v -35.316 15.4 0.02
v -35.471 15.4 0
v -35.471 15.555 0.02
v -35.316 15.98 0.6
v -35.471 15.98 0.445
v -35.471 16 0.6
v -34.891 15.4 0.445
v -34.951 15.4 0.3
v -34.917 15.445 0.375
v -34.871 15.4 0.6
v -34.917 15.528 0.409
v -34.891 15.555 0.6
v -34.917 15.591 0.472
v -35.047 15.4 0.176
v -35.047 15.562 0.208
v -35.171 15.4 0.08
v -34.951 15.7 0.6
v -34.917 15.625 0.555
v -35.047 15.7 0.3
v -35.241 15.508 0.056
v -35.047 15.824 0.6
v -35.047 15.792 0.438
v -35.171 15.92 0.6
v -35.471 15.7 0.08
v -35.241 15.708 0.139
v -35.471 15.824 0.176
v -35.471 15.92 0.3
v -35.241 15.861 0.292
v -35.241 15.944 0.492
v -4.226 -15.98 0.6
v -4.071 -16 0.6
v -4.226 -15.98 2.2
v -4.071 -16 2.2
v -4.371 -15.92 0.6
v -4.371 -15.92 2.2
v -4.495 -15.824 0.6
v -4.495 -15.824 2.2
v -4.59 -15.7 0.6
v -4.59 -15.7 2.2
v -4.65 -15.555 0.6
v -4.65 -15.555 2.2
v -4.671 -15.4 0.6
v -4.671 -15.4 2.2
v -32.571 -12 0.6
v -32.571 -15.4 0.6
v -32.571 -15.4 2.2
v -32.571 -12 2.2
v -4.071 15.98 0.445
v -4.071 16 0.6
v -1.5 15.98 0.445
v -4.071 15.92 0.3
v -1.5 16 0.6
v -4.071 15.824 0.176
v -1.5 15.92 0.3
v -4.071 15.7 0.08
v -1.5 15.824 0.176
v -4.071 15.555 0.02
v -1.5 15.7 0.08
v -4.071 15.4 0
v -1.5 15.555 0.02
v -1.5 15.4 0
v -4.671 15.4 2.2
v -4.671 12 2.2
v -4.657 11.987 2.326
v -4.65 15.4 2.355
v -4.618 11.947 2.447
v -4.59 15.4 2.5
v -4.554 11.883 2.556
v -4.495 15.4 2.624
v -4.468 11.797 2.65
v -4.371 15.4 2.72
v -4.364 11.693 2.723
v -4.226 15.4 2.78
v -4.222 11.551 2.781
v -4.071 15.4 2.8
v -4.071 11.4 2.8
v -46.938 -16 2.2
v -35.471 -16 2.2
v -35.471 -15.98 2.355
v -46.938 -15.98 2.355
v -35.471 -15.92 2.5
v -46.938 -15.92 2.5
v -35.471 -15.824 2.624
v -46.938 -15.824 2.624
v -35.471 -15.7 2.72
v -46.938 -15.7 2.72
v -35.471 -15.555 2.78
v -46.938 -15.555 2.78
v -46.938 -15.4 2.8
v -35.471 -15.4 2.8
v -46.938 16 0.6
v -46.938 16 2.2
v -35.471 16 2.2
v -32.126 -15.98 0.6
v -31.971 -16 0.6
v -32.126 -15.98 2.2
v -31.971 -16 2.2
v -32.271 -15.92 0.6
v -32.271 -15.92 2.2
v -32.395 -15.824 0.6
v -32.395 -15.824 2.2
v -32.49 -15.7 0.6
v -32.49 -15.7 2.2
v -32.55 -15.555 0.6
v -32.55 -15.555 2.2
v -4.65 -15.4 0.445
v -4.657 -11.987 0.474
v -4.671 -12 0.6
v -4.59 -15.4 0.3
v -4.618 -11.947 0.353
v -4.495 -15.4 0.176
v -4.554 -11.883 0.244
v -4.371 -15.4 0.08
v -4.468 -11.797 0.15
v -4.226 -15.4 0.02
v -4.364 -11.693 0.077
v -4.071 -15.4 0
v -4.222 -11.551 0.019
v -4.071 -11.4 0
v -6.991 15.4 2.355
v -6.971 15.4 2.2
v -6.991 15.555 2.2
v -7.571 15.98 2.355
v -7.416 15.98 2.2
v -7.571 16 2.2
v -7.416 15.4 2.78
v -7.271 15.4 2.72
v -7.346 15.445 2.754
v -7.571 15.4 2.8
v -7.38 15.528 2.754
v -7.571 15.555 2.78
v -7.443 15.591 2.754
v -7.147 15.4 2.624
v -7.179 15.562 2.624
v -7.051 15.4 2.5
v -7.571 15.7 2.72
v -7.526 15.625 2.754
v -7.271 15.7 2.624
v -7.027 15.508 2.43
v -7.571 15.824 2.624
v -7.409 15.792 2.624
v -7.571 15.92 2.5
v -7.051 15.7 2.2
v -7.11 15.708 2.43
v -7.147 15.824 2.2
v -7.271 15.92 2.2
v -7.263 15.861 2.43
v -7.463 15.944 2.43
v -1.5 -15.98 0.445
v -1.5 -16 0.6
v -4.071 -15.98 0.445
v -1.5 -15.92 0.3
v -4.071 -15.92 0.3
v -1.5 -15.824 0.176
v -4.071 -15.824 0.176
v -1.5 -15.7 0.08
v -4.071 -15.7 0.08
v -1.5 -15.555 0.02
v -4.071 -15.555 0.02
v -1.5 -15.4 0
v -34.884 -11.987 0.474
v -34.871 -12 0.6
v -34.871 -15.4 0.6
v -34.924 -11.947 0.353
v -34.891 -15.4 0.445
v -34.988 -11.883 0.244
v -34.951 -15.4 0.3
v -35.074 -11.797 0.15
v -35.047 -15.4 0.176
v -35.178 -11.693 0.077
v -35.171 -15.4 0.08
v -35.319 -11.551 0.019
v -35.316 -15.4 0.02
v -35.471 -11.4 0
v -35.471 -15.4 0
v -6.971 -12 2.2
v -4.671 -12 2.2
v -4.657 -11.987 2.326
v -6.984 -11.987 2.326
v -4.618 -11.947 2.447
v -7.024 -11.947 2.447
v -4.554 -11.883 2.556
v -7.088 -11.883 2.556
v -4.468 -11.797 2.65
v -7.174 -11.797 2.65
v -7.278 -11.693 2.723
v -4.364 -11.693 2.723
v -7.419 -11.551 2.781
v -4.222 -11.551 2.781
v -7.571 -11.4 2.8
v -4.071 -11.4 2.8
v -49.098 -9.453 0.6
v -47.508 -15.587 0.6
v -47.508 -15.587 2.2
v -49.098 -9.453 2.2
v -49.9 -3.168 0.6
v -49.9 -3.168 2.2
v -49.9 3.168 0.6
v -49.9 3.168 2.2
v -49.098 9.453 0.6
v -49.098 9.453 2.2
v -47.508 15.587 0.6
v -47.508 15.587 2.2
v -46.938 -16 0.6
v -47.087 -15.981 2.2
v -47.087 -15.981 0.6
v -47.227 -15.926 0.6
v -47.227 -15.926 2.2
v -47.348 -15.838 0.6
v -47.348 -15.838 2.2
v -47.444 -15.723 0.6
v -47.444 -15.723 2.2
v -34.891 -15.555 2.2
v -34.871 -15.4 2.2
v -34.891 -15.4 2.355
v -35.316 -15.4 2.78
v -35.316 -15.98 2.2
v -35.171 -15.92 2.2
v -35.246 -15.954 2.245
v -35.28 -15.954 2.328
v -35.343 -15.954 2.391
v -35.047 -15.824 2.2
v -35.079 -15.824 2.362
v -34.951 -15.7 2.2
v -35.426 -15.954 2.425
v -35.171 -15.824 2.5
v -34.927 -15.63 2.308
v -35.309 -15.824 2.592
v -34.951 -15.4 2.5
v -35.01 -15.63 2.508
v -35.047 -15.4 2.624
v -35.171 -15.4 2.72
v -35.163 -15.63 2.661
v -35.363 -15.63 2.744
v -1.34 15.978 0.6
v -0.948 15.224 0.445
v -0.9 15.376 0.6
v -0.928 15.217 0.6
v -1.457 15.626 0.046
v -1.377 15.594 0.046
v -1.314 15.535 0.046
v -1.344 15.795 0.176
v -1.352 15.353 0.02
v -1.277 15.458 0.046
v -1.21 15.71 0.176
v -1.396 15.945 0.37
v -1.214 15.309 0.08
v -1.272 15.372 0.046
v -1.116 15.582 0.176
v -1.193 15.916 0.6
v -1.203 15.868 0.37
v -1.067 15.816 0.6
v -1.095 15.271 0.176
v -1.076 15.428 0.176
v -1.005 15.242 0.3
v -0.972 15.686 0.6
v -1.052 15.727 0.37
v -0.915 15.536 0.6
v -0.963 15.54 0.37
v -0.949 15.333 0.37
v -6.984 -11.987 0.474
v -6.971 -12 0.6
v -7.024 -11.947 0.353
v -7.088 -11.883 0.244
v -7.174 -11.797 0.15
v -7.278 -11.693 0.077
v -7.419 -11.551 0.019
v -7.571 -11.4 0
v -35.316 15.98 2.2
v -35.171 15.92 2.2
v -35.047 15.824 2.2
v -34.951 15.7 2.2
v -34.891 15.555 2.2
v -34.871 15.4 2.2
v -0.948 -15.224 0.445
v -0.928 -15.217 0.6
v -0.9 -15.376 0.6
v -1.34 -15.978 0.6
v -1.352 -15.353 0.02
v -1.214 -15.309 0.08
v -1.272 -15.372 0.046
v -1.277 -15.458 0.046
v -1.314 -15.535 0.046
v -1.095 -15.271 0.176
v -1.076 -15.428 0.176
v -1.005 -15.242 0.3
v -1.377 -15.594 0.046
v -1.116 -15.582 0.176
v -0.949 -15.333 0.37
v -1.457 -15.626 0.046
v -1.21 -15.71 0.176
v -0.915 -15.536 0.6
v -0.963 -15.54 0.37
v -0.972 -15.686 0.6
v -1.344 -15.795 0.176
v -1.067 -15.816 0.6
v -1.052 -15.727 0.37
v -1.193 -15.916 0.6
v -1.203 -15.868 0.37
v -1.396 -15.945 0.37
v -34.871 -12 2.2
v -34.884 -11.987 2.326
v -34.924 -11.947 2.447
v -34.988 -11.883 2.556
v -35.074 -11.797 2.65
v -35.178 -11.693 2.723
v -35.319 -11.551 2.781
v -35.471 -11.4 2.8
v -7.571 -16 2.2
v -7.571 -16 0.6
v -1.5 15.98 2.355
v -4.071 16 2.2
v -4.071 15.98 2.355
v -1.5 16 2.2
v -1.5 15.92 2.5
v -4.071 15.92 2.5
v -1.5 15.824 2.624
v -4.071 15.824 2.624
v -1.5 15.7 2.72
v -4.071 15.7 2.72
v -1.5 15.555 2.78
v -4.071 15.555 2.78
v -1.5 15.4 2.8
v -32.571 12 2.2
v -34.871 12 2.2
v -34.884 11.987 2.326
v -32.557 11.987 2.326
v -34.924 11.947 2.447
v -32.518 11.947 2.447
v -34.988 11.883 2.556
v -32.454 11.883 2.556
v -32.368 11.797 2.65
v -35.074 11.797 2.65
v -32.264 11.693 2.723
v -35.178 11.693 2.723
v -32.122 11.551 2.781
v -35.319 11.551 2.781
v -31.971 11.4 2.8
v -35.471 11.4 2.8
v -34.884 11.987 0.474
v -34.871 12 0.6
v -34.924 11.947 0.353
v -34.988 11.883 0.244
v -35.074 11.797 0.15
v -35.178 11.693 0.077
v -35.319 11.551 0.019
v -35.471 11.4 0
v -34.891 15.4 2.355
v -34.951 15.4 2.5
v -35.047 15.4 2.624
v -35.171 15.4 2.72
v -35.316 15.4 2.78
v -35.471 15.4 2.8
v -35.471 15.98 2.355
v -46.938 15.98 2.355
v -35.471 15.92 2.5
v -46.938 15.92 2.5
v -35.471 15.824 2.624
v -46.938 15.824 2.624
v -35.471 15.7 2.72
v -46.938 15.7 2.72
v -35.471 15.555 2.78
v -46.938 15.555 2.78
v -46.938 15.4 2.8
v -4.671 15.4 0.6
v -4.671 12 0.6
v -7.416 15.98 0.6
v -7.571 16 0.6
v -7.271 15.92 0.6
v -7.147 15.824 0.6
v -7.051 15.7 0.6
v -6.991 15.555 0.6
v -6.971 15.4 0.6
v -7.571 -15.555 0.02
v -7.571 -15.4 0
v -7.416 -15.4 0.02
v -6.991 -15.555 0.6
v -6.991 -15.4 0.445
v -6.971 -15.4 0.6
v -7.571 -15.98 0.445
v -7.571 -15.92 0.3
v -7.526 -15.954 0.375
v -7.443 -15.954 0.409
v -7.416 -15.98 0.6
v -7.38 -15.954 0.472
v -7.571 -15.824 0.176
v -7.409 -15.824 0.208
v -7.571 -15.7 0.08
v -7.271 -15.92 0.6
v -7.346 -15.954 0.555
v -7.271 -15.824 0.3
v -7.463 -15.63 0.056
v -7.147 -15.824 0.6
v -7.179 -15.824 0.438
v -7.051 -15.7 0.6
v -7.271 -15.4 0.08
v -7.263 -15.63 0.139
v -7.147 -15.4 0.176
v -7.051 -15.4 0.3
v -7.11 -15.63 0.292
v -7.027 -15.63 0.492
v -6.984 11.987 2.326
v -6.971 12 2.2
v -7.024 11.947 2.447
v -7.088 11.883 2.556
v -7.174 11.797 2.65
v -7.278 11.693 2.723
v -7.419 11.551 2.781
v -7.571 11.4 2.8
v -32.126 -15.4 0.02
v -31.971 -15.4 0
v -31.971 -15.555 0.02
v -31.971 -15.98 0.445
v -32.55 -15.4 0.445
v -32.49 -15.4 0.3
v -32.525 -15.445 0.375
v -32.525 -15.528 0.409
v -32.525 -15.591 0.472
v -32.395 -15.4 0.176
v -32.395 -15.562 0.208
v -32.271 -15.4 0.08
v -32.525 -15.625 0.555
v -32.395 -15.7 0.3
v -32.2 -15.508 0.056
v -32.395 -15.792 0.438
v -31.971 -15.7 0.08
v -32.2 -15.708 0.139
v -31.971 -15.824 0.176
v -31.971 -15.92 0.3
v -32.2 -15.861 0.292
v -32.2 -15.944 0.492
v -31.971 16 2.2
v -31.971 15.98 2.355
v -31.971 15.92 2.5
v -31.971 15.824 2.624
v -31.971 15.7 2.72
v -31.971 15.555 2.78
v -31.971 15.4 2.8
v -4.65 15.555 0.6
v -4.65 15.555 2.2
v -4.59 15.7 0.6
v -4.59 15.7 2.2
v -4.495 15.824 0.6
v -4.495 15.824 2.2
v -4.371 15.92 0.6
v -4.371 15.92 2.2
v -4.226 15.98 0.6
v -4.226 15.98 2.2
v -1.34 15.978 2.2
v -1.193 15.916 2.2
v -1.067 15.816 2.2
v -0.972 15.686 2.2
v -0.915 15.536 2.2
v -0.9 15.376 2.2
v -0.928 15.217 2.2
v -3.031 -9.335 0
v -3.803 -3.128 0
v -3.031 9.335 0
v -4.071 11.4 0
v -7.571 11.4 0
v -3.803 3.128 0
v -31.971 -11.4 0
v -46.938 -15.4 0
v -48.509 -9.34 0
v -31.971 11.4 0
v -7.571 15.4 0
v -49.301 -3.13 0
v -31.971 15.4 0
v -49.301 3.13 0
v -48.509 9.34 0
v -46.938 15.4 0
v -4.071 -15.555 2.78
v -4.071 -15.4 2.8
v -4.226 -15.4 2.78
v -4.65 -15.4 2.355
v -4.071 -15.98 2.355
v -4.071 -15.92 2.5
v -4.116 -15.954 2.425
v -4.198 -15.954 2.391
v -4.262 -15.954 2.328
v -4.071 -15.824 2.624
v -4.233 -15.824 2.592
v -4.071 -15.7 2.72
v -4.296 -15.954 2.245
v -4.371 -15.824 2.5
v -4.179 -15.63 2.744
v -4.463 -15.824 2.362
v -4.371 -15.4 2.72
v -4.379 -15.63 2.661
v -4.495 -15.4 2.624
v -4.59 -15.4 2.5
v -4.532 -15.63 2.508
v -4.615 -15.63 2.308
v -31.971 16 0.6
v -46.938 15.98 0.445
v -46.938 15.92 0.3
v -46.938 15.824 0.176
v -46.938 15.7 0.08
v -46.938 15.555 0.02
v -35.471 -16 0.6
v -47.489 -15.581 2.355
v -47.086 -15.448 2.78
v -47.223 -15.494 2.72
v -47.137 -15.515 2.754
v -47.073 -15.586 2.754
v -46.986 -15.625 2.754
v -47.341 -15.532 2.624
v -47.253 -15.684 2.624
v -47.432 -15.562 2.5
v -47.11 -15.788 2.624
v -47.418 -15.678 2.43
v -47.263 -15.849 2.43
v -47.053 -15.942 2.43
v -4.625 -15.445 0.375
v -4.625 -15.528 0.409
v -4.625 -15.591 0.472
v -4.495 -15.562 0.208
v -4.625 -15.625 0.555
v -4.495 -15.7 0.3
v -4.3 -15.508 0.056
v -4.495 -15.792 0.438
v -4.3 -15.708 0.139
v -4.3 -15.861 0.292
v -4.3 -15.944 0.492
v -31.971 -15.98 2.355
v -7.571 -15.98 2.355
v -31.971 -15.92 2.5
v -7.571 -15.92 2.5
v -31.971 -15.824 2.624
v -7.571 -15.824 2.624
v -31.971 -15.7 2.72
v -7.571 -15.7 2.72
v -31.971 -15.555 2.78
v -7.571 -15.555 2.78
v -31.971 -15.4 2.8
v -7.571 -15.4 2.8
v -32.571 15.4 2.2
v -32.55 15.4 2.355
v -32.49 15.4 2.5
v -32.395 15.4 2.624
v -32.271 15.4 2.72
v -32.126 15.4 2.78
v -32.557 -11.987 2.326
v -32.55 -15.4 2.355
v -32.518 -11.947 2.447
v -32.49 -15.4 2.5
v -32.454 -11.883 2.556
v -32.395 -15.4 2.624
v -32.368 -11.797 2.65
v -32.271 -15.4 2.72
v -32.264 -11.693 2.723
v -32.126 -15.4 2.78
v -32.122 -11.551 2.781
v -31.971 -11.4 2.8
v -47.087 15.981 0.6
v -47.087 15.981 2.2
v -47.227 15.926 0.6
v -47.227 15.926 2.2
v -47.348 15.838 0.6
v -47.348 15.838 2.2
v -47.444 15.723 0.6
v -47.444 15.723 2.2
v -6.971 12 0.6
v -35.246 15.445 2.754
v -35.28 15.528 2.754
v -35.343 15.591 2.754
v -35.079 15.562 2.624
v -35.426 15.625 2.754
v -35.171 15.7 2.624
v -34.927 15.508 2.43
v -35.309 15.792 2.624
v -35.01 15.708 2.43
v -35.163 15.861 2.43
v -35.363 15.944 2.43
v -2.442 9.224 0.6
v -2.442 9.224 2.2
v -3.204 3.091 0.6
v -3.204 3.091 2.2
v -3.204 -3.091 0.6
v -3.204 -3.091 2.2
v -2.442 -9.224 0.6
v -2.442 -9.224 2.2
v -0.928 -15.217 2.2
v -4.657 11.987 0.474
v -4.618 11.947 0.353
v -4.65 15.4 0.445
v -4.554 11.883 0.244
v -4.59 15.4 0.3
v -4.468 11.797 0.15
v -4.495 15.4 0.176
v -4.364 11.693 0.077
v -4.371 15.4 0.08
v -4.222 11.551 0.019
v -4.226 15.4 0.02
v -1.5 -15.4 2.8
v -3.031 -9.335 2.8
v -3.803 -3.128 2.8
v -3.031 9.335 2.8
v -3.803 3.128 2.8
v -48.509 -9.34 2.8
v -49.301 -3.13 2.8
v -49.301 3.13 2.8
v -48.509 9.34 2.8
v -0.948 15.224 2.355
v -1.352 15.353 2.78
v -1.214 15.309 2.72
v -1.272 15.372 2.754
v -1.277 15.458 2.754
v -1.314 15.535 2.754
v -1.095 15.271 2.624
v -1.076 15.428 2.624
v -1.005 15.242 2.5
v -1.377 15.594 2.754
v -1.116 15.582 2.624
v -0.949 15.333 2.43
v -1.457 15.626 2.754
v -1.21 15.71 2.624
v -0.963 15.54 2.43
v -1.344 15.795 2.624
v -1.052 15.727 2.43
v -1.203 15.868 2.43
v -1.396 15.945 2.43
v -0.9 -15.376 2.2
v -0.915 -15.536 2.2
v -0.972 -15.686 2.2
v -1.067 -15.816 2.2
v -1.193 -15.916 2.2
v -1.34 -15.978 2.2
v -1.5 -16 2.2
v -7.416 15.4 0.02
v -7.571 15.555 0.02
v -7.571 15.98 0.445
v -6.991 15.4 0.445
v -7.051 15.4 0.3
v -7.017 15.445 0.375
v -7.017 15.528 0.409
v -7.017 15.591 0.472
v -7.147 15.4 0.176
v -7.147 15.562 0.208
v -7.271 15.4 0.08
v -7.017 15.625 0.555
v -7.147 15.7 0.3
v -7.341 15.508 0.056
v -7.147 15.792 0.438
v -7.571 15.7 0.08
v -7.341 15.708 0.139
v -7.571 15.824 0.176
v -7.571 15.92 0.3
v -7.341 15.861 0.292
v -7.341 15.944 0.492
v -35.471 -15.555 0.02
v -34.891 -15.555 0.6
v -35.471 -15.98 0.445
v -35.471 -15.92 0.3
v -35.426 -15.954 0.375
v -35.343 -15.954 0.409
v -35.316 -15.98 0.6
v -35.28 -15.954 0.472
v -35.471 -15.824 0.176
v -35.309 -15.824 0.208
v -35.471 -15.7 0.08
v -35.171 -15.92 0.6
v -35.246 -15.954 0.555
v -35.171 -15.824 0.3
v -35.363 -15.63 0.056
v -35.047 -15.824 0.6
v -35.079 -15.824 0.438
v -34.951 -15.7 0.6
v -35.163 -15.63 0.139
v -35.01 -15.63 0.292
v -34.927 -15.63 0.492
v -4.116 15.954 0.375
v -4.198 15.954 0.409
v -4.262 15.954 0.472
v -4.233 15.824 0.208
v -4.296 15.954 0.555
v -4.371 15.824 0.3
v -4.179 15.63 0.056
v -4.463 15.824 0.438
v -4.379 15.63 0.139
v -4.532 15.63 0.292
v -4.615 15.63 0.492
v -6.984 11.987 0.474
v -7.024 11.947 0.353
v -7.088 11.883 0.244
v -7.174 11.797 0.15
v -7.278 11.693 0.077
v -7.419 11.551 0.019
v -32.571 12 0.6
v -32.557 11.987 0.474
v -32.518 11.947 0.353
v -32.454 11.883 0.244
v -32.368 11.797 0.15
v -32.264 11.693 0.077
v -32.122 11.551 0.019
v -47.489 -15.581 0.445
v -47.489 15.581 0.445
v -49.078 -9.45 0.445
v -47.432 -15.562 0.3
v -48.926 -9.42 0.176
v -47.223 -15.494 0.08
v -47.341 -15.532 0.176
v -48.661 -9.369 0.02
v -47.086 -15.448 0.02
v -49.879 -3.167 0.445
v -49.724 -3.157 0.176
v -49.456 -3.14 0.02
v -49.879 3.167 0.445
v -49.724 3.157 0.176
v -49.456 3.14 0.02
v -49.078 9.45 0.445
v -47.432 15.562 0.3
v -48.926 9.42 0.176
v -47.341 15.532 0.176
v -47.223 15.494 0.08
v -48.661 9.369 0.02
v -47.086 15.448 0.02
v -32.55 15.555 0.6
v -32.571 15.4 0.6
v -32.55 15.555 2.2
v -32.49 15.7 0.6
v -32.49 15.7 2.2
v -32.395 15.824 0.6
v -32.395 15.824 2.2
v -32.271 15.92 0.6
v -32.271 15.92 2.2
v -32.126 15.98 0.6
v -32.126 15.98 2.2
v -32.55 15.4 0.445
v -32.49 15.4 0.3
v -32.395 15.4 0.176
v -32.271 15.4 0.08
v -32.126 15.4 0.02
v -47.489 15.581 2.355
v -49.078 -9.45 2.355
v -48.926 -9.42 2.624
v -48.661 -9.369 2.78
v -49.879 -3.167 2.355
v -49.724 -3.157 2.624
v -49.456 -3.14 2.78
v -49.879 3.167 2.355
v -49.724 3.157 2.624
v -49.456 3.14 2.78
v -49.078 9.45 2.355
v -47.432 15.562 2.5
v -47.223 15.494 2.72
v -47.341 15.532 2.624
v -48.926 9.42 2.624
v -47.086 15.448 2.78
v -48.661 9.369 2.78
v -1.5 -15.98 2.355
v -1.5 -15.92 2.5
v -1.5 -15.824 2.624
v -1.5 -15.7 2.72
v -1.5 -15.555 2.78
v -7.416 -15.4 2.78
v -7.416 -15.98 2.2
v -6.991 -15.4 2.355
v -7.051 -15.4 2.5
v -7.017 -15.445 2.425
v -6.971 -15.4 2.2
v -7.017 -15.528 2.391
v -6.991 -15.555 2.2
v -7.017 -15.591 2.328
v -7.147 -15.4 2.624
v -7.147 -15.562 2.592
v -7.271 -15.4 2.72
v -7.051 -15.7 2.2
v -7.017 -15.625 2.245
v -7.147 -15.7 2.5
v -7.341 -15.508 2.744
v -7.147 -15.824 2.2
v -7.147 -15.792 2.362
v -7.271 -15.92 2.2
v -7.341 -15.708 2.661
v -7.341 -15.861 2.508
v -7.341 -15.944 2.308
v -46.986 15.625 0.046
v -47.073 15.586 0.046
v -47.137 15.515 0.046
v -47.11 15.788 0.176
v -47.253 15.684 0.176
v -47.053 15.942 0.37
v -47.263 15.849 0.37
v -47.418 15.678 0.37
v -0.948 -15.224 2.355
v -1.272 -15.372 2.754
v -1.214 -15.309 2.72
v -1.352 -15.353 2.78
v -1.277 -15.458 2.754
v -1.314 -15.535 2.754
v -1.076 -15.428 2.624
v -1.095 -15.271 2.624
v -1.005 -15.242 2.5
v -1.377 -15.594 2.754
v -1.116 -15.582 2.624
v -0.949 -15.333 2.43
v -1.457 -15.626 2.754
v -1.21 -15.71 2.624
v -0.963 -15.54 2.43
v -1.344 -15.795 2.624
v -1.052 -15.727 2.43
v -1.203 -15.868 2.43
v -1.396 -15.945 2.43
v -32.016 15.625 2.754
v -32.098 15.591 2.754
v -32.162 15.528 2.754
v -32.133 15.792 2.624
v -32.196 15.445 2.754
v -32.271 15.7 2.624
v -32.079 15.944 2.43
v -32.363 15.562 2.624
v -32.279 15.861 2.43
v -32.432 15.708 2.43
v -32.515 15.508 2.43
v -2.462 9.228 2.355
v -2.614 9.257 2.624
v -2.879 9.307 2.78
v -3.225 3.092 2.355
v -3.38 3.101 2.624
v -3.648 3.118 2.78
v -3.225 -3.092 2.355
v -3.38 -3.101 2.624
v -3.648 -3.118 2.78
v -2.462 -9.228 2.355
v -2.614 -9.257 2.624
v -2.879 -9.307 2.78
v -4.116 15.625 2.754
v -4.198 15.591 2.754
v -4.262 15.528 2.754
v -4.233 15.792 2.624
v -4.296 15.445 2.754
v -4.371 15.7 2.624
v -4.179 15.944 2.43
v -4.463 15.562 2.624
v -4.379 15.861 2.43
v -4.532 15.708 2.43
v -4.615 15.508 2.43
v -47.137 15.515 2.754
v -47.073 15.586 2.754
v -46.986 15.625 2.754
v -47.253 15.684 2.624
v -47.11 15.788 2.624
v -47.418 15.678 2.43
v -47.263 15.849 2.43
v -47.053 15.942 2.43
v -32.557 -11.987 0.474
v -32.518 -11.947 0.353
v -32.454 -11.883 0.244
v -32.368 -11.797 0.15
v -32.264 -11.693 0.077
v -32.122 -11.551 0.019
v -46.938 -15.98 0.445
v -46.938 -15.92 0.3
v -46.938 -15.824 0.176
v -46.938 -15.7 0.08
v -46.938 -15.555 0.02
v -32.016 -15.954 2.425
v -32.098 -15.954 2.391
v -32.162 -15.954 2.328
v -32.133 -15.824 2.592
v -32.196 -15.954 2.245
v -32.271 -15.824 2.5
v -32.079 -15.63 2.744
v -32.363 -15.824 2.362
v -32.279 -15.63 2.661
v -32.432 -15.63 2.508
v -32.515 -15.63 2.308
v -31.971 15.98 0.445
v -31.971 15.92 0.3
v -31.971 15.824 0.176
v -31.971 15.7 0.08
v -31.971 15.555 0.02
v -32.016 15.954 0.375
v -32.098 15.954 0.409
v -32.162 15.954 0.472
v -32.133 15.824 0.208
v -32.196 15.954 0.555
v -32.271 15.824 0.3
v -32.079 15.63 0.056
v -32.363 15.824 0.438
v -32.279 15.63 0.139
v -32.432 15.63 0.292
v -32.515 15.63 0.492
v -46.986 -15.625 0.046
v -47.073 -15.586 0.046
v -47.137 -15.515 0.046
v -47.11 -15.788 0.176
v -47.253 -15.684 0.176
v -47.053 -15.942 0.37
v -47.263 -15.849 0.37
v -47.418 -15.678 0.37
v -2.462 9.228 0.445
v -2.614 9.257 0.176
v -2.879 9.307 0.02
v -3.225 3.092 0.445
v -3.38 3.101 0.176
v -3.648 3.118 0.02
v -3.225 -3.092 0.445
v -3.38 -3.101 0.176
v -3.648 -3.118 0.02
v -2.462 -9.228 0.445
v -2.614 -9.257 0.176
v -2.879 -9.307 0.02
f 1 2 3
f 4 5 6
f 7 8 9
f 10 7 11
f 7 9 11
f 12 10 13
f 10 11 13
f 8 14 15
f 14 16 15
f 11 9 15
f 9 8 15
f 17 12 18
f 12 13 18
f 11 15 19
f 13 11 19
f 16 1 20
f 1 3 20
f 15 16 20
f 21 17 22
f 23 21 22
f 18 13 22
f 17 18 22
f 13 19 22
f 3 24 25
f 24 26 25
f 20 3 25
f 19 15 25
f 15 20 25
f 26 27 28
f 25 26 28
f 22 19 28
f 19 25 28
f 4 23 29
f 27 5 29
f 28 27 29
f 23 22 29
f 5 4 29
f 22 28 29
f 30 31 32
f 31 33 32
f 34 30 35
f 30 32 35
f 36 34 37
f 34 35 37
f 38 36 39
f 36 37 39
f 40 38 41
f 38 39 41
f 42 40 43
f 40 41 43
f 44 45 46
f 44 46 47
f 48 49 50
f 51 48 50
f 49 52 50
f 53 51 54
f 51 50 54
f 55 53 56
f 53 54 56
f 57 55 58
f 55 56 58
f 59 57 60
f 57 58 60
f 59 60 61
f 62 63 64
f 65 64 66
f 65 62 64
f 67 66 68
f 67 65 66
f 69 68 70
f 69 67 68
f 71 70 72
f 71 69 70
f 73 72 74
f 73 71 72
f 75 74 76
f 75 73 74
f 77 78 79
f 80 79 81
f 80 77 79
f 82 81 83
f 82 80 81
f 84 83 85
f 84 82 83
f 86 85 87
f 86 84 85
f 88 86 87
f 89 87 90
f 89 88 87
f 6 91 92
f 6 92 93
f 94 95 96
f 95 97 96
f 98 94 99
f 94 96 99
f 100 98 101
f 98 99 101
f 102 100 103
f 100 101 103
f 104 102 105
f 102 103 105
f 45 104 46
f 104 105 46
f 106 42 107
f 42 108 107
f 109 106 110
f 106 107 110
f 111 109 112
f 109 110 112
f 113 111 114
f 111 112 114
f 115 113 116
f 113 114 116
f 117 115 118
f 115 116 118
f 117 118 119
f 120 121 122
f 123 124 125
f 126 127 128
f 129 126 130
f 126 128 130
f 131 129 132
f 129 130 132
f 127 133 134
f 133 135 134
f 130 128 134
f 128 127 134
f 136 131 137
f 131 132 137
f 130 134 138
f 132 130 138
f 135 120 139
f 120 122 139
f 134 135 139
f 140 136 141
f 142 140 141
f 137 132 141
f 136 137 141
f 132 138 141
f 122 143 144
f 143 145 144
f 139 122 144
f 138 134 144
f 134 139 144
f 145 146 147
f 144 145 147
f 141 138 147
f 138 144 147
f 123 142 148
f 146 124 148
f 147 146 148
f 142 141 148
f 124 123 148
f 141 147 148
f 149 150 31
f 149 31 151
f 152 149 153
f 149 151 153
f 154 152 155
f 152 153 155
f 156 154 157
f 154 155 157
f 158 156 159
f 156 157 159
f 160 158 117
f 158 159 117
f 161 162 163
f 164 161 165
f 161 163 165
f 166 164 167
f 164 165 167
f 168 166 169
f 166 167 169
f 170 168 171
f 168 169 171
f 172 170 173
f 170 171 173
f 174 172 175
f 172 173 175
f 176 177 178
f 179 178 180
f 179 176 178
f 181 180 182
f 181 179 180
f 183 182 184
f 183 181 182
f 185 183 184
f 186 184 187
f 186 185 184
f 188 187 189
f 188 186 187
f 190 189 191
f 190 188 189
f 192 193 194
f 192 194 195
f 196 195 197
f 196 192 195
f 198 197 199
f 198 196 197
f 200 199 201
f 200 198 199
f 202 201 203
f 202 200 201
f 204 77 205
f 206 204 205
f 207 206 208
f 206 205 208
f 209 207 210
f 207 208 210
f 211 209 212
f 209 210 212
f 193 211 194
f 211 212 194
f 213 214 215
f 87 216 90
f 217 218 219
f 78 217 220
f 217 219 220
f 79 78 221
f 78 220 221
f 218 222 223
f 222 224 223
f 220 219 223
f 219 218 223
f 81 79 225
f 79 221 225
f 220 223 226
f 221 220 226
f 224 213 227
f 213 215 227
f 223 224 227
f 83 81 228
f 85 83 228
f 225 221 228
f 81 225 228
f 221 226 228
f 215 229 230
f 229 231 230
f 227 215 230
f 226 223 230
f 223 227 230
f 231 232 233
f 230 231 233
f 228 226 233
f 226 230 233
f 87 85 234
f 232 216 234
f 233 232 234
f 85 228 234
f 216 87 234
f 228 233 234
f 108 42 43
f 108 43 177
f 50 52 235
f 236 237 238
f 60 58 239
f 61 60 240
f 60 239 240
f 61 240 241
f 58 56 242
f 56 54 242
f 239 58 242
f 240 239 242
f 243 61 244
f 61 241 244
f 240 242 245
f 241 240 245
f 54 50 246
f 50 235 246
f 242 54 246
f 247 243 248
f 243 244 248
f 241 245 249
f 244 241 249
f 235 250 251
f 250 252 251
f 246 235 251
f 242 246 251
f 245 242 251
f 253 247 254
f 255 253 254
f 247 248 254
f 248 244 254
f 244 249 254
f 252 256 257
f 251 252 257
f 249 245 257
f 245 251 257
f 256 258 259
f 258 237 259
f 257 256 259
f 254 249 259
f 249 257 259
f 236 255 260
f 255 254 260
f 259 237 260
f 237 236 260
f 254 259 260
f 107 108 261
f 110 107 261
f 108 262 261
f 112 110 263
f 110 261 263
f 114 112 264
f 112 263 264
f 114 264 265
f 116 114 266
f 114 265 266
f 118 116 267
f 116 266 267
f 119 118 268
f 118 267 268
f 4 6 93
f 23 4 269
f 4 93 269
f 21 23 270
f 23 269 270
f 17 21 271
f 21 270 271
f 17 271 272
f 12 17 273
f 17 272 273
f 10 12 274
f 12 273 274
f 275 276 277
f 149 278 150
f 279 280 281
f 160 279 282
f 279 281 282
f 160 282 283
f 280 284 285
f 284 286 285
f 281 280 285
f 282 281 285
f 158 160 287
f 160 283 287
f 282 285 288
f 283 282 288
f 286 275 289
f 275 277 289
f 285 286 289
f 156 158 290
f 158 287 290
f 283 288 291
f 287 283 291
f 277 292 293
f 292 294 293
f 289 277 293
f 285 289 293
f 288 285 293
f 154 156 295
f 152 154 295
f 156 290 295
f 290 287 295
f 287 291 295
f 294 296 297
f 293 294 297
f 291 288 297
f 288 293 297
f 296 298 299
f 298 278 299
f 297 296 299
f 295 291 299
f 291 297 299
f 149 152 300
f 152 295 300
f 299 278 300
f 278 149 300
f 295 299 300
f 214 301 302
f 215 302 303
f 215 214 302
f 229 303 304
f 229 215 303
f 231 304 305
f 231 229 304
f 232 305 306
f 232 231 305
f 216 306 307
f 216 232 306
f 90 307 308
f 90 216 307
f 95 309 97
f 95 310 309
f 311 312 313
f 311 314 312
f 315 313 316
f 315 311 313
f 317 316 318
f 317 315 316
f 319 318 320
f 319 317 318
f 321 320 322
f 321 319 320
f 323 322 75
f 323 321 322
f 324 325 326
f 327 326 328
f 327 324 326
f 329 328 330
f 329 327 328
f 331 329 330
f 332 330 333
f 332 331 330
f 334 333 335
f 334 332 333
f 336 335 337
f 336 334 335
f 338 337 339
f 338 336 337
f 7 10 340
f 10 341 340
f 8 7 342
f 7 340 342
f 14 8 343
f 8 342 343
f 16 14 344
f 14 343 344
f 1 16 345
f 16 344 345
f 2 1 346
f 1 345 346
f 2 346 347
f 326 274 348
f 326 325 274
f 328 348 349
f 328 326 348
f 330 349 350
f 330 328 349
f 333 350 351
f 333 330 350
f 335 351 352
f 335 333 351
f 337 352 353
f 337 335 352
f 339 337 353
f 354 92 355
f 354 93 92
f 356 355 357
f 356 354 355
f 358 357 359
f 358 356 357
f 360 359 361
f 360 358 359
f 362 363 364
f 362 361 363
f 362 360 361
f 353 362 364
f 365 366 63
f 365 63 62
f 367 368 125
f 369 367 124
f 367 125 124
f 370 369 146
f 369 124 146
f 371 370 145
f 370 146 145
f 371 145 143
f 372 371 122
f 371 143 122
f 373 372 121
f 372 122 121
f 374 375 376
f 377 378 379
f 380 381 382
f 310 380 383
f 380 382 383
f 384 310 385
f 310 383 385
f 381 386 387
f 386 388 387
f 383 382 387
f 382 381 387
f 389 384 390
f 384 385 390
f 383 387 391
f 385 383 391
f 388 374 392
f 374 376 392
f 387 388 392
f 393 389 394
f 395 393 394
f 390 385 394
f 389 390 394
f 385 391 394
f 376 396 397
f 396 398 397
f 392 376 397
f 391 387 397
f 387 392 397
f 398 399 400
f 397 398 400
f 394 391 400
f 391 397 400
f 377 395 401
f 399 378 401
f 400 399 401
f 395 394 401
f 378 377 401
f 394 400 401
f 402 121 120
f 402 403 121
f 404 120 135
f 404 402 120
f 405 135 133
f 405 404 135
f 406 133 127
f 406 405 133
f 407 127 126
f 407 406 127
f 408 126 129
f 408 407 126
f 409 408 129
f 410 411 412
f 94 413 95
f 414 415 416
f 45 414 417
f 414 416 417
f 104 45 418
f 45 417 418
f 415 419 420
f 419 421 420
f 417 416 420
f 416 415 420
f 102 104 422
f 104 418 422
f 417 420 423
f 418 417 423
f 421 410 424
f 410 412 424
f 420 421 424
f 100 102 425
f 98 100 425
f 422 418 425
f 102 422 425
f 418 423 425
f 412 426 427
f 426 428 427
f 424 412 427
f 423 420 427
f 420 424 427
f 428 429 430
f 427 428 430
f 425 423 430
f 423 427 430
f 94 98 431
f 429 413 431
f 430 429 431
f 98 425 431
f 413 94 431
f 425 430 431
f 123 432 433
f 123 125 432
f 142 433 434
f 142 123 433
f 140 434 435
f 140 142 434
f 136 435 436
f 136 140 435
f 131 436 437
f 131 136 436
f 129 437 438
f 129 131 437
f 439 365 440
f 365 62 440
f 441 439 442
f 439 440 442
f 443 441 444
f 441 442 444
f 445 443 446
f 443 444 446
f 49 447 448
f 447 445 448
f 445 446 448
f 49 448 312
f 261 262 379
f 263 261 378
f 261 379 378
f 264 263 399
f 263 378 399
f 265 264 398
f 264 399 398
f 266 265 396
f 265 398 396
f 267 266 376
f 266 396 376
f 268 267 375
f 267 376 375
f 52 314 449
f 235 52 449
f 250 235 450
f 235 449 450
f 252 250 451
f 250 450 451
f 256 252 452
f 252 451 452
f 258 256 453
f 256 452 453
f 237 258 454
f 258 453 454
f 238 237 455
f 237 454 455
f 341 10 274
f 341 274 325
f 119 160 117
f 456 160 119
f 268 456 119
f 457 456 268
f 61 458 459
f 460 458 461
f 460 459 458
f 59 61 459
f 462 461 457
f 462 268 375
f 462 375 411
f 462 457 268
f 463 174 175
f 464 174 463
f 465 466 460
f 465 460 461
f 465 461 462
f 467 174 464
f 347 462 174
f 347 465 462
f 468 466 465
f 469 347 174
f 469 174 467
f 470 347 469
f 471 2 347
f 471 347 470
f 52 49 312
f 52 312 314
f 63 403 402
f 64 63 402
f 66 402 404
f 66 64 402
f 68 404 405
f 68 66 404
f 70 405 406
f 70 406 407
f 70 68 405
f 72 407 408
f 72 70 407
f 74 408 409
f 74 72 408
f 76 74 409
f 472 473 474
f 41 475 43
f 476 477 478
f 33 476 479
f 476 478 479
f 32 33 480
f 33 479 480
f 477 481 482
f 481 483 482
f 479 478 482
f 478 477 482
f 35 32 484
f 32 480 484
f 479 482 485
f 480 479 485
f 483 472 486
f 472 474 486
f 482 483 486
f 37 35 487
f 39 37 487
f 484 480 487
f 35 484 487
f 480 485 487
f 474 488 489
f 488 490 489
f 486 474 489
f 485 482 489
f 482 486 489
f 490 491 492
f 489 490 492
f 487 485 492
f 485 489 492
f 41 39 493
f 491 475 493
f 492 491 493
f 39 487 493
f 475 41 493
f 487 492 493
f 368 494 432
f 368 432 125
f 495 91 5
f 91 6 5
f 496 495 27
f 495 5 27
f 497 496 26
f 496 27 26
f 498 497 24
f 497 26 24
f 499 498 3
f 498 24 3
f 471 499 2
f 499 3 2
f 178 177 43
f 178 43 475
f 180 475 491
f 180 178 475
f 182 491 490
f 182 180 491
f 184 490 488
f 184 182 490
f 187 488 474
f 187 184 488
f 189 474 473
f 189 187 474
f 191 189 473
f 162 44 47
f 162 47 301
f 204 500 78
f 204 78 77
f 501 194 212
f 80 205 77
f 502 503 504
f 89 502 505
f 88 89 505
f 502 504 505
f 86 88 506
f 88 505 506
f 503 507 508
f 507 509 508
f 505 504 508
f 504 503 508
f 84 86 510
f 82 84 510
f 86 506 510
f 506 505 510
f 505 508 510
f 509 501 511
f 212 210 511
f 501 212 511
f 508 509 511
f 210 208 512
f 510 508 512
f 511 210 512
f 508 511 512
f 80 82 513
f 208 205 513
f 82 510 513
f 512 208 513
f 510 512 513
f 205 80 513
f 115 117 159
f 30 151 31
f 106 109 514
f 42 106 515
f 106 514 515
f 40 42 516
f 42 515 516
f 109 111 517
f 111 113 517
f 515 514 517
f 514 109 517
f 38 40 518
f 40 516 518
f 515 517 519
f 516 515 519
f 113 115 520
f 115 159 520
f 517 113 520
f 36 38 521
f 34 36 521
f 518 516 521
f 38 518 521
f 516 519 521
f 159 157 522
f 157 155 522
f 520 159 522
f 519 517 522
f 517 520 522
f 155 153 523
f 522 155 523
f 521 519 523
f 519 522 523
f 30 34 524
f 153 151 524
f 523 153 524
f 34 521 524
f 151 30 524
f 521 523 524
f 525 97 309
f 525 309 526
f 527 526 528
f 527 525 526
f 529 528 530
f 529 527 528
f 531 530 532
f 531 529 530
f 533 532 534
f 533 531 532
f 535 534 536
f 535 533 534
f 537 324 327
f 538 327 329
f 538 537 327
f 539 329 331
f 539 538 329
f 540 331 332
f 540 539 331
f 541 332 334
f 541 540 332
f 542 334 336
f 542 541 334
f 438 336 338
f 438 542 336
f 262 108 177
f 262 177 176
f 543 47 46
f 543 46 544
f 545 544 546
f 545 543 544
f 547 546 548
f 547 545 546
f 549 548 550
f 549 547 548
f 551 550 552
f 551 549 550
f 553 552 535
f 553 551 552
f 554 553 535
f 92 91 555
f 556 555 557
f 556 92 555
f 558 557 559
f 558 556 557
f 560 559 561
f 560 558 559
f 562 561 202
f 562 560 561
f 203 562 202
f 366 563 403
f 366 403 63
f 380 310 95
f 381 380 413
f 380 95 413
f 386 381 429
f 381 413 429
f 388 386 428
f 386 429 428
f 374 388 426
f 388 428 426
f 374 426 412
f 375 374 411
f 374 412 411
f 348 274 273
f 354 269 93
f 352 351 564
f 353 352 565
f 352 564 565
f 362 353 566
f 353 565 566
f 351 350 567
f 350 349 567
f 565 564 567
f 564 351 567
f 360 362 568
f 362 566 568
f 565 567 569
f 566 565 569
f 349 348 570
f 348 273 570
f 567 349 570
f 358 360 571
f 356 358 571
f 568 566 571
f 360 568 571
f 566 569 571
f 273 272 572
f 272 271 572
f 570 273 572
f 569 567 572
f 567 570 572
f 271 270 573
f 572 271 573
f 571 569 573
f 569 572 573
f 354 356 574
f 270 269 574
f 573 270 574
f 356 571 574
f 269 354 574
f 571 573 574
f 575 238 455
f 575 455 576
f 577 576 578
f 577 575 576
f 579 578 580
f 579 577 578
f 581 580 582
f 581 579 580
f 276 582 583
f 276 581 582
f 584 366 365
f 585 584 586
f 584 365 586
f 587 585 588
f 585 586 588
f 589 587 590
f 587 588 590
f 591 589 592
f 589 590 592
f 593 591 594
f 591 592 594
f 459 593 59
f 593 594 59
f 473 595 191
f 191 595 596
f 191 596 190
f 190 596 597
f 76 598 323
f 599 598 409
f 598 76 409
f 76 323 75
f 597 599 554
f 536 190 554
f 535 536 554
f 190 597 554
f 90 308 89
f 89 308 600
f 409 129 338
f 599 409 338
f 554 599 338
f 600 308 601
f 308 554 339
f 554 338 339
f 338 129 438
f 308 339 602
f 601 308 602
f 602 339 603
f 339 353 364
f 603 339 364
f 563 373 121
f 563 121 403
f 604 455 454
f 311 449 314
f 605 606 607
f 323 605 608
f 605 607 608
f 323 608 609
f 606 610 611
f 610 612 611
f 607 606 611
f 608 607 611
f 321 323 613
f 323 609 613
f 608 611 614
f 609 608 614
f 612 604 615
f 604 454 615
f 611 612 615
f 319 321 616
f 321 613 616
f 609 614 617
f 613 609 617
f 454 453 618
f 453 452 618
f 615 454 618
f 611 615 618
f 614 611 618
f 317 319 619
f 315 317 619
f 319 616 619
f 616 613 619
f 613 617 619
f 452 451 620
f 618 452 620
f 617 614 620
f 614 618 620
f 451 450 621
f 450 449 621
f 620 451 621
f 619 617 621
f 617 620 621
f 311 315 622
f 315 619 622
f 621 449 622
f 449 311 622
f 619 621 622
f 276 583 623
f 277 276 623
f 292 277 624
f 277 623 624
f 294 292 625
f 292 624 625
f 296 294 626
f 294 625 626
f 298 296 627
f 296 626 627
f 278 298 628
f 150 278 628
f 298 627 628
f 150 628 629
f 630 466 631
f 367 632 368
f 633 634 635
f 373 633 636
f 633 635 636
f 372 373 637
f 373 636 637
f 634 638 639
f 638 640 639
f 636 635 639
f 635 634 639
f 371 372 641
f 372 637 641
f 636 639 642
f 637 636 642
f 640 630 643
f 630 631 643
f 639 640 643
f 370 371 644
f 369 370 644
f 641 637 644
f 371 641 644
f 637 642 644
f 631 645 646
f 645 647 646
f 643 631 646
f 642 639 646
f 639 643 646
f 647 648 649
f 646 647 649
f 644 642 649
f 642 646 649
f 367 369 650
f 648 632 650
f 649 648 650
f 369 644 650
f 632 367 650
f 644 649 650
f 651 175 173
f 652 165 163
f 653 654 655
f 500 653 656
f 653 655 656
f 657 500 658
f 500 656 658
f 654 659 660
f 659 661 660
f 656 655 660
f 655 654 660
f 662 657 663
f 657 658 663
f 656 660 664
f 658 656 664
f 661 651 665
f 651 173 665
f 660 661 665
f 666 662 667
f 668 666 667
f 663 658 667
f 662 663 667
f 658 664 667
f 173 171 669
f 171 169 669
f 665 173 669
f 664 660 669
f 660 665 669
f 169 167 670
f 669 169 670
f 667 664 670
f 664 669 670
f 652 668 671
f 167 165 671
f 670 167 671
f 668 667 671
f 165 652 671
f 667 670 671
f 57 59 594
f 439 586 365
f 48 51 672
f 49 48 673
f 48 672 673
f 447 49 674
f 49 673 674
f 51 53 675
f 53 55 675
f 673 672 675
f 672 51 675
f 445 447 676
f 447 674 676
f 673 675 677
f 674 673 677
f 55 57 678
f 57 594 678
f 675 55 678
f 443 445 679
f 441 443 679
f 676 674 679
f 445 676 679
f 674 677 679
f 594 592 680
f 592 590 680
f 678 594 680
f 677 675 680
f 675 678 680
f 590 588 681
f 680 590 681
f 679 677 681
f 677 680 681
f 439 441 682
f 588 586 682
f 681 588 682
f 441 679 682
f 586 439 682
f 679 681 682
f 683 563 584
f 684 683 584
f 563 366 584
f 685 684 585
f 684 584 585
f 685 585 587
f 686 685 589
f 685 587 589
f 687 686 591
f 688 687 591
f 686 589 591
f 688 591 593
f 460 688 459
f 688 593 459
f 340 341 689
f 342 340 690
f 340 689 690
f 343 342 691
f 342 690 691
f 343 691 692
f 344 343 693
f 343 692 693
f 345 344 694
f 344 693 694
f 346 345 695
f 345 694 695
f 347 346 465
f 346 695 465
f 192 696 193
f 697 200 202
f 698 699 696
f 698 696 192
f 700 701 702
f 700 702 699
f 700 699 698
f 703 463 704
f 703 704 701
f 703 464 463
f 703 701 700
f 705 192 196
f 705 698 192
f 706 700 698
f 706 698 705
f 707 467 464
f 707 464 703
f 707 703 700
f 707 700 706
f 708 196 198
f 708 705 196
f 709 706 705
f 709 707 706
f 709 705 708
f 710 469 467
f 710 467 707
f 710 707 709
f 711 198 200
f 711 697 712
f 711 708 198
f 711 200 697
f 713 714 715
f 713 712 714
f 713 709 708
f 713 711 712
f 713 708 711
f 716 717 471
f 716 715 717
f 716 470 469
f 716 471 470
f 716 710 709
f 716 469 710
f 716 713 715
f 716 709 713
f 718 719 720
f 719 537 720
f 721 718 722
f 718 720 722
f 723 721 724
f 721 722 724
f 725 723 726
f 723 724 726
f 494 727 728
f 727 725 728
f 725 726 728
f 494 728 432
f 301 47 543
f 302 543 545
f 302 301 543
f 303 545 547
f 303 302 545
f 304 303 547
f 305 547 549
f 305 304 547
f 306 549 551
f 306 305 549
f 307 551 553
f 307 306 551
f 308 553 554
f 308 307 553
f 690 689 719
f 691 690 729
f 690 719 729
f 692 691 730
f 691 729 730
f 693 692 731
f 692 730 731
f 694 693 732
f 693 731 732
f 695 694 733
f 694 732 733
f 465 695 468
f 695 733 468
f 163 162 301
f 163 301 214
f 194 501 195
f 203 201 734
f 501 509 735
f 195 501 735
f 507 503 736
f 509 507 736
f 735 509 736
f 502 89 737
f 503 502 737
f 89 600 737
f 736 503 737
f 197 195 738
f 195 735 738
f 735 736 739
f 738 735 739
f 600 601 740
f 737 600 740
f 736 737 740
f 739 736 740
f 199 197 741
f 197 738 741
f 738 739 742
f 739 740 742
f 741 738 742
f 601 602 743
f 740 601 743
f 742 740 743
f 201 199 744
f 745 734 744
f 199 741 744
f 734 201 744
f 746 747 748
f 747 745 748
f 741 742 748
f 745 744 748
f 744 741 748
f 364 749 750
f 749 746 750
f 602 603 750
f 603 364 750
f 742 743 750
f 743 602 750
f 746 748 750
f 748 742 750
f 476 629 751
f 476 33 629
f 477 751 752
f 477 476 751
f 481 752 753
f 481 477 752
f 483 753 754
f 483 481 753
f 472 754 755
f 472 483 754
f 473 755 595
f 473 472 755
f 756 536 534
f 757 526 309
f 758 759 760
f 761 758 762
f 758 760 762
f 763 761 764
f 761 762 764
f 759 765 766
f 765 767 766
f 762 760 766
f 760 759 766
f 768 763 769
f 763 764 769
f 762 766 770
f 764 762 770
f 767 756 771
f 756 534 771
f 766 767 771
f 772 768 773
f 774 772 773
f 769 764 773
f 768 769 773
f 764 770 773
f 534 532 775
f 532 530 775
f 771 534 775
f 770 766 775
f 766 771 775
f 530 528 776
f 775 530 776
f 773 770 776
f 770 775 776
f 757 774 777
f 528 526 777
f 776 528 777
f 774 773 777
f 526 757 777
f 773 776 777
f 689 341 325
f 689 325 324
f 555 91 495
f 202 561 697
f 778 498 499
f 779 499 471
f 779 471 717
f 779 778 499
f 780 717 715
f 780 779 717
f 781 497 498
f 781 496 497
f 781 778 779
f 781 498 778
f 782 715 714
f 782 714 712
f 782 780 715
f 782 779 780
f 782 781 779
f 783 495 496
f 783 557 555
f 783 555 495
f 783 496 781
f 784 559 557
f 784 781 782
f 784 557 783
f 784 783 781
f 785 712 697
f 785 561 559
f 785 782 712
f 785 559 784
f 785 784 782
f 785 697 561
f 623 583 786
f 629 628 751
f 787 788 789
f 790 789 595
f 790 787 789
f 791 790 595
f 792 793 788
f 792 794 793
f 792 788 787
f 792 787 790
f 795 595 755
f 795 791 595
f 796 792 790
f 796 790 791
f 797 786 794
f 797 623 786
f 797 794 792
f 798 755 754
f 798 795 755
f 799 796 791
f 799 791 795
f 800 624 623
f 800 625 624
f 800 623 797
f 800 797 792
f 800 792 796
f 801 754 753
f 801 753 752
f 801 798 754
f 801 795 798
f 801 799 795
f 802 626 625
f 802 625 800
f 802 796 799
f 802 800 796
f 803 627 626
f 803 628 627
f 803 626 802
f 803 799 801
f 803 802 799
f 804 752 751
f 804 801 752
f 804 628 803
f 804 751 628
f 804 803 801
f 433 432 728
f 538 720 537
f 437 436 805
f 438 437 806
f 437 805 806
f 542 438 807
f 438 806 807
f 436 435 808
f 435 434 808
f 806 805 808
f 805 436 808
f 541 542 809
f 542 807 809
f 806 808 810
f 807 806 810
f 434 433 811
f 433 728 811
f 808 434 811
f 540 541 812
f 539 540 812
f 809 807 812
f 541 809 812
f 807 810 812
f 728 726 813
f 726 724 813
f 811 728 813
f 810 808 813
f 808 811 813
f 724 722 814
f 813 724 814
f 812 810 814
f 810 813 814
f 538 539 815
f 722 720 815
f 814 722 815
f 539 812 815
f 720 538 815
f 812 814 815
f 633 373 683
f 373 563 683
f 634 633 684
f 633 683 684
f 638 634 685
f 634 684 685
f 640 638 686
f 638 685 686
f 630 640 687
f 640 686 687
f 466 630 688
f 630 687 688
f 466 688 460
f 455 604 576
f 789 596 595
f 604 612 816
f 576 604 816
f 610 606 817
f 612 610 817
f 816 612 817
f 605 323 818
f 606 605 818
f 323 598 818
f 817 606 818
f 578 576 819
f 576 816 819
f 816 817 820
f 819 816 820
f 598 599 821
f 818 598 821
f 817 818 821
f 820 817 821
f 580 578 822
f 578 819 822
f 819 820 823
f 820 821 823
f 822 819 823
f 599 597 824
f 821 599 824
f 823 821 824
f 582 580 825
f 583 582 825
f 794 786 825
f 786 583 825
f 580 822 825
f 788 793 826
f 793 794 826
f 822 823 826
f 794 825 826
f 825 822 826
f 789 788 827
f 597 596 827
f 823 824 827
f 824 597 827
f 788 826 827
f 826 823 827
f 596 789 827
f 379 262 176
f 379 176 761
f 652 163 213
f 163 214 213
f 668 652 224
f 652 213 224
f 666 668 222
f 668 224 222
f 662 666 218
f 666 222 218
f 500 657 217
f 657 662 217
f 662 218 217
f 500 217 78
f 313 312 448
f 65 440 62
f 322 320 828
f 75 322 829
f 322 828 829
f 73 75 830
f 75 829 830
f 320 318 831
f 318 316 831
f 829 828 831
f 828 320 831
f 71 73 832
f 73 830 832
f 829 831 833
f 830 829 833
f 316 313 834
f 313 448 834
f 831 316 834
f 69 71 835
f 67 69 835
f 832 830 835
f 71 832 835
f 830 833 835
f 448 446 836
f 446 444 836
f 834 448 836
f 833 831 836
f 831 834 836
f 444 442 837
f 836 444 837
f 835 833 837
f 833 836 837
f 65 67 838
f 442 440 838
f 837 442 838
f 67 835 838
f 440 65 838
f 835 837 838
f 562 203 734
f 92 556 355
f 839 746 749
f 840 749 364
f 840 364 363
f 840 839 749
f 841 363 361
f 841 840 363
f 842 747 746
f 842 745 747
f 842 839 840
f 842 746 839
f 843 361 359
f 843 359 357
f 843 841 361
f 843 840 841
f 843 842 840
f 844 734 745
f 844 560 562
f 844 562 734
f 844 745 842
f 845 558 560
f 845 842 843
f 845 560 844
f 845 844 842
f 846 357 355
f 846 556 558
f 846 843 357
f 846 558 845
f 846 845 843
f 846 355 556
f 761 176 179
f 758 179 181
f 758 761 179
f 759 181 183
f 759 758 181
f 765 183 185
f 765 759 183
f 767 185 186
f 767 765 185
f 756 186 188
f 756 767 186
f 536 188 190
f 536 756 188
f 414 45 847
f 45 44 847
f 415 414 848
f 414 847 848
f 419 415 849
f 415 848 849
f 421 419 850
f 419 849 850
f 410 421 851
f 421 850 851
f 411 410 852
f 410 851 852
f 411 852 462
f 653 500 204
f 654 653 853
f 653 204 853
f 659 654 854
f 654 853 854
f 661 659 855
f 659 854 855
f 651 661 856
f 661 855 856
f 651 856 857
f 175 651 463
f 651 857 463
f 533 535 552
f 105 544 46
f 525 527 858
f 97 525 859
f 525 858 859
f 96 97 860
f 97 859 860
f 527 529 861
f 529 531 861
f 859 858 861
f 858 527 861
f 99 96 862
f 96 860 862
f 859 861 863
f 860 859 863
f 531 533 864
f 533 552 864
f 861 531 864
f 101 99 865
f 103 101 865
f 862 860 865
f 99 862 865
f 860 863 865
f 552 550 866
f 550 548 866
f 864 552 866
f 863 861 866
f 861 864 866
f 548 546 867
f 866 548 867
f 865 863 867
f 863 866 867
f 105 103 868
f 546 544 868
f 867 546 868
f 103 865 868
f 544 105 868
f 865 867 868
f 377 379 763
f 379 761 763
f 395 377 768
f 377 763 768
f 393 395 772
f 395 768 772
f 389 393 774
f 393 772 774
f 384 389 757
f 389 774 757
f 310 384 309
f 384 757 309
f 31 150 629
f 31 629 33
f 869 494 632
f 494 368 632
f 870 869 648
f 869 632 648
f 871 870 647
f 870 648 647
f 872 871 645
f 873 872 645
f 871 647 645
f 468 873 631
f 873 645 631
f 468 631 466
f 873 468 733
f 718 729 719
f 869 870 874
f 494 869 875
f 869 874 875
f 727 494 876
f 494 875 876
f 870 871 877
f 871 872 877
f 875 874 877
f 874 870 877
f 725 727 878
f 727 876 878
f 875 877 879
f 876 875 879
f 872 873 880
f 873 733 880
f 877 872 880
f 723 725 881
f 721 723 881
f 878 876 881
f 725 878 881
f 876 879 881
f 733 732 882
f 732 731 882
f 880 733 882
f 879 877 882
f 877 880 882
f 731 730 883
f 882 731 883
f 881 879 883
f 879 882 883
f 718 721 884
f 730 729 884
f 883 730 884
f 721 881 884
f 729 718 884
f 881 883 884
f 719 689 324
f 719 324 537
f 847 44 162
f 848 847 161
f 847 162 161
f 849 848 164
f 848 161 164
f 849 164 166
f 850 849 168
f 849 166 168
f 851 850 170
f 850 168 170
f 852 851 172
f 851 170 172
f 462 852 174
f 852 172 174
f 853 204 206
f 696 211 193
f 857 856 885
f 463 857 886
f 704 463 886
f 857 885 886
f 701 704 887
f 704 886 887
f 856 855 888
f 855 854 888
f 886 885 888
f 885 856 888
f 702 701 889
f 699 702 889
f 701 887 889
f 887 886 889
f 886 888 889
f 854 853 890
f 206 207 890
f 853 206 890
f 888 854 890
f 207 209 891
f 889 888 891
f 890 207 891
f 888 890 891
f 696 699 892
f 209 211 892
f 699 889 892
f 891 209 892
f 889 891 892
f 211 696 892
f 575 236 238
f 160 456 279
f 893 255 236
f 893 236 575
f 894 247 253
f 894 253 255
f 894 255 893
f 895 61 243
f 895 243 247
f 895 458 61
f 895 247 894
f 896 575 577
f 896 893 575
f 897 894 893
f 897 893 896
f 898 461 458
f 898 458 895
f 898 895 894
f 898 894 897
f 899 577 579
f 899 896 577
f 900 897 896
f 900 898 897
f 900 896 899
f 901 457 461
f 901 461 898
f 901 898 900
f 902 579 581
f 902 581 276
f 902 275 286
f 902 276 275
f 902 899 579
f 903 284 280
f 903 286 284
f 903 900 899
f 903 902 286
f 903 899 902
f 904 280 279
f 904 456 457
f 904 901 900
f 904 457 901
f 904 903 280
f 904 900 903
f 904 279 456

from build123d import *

# Parameters (mm, degrees)
BOSS_EXTRU_1_DEPTH = 2.8
CONG_1_R           = 0.6


with BuildPart() as part:
    # Esquisse1 → Boss.-Extru.1 (new body)
    with BuildSketch(Plane.XY):
        with BuildLine():
            Line((-47.370877129, 16), (-34.870877129, 16))
            Line((-34.870877129, 16), (-34.870877129, 12))
            Line((-34.870877129, 12), (-32.570877129, 12))
            Line((-32.570877129, 12), (-32.570877129, 16))
            Line((-32.570877129, 16), (-6.970877129, 16))
            Line((-6.970877129, 16), (-6.970877129, 12))
            Line((-6.970877129, 12), (-4.670877129, 12))
            Line((-4.670877129, 12), (-4.670877129, 16))
            Line((-4.670877129, 16), (-0.670877129, 16))
            ThreePointArc((-0.670877129, 16), (-3.3, 0), (-0.670877129, -16))
            Line((-0.670877129, -16), (-4.670877129, -16))
            Line((-4.670877129, -16), (-4.670877129, -12))
            Line((-4.670877129, -12), (-6.970877129, -12))
            Line((-6.970877129, -12), (-6.970877129, -16))
            Line((-6.970877129, -16), (-32.570877129, -16))
            Line((-32.570877129, -16), (-32.570877129, -12))
            Line((-32.570877129, -12), (-34.870877129, -12))
            Line((-34.870877129, -12), (-34.870877129, -16))
            Line((-34.870877129, -16), (-47.370877129, -16))
            ThreePointArc((-47.370877129, -16), (-50, 0), (-47.370877129, 16))
        make_face()
    extrude(amount=BOSS_EXTRU_1_DEPTH)

    # Congé1
    cong_1_edges = [part.edges().sort_by_distance(p)[0] for p in [
        (-34.870877129, -14, 2.8),
        (-33.720877129, -12, 2.8),
        (-32.570877129, -14, 2.8),
        (-41.120877129, 16, 0),
        (-34.870877129, 14, 0),
        (-33.720877129, 12, 0),
        (-32.570877129, 14, 0),
        (-19.770877129, 16, 0),
        (-19.770877129, -16, 2.8),
        (-6.970877129, 14, 0),
        (-5.820877129, 12, 0),
        (-4.670877129, 14, 0),
        (-2.670877129, 16, 0),
        (-3.3, 0, 0),
        (-2.670877129, -16, 0),
        (-4.670877129, -14, 0),
        (-6.970877129, -14, 2.8),
        (-5.820877129, -12, 0),
        (-6.970877129, -14, 0),
        (-19.770877129, -16, 0),
        (-32.570877129, -14, 0),
        (-33.720877129, -12, 0),
        (-34.870877129, -14, 0),
        (-41.120877129, -16, 0),
        (-50, 0, 0),
        (-5.820877129, -12, 2.8),
        (-4.670877129, -14, 2.8),
        (-2.670877129, -16, 2.8),
        (-47.370877129, 16, 1.4),
        (-34.870877129, 16, 1.4),
        (-32.570877129, 16, 1.4),
        (-6.970877129, 16, 1.4),
        (-4.670877129, 16, 1.4),
        (-0.670877129, 16, 1.4),
        (-0.670877129, -16, 1.4),
        (-4.670877129, -16, 1.4),
        (-6.970877129, -16, 1.4),
        (-32.570877129, -16, 1.4),
        (-34.870877129, -16, 1.4),
        (-47.370877129, -16, 1.4),
        (-3.3, 0, 2.8),
        (-2.670877129, 16, 2.8),
        (-50, 0, 2.8),
        (-4.670877129, 14, 2.8),
        (-5.820877129, 12, 2.8),
        (-6.970877129, 14, 2.8),
        (-19.770877129, 16, 2.8),
        (-32.570877129, 14, 2.8),
        (-33.720877129, 12, 2.8),
        (-34.870877129, 14, 2.8),
        (-41.120877129, 16, 2.8),
        (-41.120877129, -16, 2.8),
    ]]
    fillet(cong_1_edges, radius=CONG_1_R)


solid = part.part
